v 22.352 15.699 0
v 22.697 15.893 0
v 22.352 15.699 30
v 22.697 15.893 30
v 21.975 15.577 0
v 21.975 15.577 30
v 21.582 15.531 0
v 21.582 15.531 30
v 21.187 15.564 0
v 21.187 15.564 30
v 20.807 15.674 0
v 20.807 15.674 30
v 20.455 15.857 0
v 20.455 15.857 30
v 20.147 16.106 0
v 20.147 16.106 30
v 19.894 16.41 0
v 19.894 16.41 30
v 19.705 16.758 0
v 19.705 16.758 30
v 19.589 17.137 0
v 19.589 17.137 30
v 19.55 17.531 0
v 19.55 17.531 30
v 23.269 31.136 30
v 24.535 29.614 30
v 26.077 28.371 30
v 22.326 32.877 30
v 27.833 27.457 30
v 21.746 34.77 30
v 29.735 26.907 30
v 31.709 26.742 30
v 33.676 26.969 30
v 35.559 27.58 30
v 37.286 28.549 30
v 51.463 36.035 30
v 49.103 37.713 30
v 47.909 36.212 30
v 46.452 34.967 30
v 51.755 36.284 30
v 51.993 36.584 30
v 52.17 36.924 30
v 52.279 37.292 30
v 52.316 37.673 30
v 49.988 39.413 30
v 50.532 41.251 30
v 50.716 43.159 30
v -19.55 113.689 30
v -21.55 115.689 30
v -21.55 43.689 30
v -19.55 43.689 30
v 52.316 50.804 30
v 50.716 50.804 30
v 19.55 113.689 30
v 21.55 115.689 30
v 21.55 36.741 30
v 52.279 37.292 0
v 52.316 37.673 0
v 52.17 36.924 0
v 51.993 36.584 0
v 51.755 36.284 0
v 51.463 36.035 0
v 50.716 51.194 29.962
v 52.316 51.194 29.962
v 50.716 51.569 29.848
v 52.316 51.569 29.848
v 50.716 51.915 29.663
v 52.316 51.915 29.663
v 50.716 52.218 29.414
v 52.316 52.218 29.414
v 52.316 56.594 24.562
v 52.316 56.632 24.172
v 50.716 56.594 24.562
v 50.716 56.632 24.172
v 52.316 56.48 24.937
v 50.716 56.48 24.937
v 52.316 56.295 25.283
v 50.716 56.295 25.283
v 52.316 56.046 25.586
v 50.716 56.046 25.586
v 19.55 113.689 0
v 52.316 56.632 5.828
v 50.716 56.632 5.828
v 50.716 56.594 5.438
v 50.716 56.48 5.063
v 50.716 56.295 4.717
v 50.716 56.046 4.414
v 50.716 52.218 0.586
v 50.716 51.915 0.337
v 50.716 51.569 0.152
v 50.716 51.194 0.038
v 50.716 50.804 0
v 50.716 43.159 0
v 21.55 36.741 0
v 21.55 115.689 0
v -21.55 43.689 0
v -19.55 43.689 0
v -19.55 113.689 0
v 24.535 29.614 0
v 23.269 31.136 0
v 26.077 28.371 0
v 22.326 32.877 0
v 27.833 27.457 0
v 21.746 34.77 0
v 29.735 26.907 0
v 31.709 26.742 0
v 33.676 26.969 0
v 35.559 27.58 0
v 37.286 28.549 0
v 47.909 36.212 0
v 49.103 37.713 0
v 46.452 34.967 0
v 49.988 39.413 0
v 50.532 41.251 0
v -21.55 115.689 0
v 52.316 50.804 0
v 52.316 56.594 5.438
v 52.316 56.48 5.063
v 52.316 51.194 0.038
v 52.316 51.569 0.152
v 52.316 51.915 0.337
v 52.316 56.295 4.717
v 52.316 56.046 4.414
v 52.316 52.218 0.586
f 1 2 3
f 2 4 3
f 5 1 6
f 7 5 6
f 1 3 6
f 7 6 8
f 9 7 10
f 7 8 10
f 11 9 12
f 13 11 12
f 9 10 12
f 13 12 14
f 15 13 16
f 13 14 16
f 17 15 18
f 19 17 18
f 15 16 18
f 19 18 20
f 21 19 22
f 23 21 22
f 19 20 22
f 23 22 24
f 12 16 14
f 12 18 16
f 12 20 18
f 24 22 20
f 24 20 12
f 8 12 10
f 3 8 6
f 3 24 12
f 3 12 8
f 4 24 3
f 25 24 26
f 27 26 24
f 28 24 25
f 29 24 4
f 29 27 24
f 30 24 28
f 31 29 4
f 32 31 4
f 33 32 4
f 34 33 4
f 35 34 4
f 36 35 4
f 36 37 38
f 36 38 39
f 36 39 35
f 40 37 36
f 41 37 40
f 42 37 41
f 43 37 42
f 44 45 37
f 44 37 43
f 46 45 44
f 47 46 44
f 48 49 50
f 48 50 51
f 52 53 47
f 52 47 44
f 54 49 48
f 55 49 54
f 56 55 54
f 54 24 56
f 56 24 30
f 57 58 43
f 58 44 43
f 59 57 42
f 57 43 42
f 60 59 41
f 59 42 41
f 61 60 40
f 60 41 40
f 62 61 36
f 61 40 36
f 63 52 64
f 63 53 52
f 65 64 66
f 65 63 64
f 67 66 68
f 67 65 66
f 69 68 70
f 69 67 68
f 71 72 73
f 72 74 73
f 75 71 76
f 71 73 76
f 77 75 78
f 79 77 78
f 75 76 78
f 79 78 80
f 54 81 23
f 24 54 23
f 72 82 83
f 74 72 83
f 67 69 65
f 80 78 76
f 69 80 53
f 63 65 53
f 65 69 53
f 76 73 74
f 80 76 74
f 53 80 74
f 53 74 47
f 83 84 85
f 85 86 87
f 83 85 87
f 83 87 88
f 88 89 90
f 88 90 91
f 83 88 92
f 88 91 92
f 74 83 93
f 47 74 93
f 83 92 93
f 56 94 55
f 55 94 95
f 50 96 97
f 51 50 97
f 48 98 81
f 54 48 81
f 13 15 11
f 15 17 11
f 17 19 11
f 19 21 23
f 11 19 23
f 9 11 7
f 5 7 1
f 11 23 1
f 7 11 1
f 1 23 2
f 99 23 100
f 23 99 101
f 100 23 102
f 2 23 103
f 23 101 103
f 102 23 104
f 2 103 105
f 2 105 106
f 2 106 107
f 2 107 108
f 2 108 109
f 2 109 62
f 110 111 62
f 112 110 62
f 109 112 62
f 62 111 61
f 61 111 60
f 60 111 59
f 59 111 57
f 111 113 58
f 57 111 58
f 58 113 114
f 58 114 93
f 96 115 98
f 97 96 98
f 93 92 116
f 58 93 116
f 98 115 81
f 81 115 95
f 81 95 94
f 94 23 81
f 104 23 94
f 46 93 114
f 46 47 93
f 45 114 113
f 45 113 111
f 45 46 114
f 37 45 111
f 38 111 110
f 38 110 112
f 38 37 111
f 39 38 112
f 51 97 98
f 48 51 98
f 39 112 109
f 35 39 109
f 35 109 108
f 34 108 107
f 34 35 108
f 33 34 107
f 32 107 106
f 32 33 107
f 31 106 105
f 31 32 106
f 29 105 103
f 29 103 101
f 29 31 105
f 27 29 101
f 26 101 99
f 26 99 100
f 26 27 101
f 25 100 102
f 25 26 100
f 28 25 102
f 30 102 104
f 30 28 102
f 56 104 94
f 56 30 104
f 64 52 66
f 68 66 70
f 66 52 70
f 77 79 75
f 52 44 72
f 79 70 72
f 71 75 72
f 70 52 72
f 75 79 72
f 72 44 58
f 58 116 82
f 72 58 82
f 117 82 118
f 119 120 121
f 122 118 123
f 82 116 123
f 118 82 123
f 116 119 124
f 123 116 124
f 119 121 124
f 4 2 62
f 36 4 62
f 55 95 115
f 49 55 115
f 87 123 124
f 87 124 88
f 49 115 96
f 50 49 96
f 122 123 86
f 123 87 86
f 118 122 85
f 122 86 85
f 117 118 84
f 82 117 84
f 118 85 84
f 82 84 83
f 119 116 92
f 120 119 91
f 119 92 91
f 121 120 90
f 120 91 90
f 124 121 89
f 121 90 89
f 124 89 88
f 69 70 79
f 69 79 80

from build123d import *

# Parameters (mm, degrees)
BOSS_EXTRU_1_DEPTH = 30
CONG_1_R           = 10
CHANFREIN1_SIZE    = 5
CONG_2_R           = 2


with BuildPart() as part:
    # Esquisse1 → Boss.-Extru.1 (new body)
    with BuildSketch(Plane.XY):
        Polygon((-19.55, 43.689057372), (-19.55, 113.689057372), (19.55, 113.689057372), (19.55, 13.689057372), (52.316081772, 36.632114826), (52.316081772, 56.632114826), (50.716081772, 56.632114826), (50.716081772, 37.953331942), (21.55, 17.531021626), (21.55, 115.689057372), (-21.55, 115.689057372), (-21.55, 43.689057372), align=None)
    extrude(amount=BOSS_EXTRU_1_DEPTH)

    # Congé1
    cong_1_edges = [part.edges().sort_by_distance(p)[0] for p in [
        (21.55, 17.531021626, 15),
        (50.716081772, 37.953331942, 15),
    ]]
    fillet(cong_1_edges, radius=CONG_1_R)

    # Chanfrein1
    chanfrein1_edges = [part.edges().sort_by_distance(p)[0] for p in [
        (51.516081772, 56.632114826, 0),
        (51.516081772, 56.632114826, 30),
    ]]
    chamfer(chanfrein1_edges, length=CHANFREIN1_SIZE)

    # Congé2
    cong_2_edges = [part.edges().sort_by_distance(p)[0] for p in [
        (52.316081772, 36.632114826, 15),
        (19.55, 13.689057372, 15),
        (51.516081772, 56.632114826, 25),
        (51.516081772, 56.632114826, 5),
        (51.516081772, 51.632114826, 0),
        (51.516081772, 51.632114826, 30),
    ]]
    fillet(cong_2_edges, radius=CONG_2_R)


solid = part.part
